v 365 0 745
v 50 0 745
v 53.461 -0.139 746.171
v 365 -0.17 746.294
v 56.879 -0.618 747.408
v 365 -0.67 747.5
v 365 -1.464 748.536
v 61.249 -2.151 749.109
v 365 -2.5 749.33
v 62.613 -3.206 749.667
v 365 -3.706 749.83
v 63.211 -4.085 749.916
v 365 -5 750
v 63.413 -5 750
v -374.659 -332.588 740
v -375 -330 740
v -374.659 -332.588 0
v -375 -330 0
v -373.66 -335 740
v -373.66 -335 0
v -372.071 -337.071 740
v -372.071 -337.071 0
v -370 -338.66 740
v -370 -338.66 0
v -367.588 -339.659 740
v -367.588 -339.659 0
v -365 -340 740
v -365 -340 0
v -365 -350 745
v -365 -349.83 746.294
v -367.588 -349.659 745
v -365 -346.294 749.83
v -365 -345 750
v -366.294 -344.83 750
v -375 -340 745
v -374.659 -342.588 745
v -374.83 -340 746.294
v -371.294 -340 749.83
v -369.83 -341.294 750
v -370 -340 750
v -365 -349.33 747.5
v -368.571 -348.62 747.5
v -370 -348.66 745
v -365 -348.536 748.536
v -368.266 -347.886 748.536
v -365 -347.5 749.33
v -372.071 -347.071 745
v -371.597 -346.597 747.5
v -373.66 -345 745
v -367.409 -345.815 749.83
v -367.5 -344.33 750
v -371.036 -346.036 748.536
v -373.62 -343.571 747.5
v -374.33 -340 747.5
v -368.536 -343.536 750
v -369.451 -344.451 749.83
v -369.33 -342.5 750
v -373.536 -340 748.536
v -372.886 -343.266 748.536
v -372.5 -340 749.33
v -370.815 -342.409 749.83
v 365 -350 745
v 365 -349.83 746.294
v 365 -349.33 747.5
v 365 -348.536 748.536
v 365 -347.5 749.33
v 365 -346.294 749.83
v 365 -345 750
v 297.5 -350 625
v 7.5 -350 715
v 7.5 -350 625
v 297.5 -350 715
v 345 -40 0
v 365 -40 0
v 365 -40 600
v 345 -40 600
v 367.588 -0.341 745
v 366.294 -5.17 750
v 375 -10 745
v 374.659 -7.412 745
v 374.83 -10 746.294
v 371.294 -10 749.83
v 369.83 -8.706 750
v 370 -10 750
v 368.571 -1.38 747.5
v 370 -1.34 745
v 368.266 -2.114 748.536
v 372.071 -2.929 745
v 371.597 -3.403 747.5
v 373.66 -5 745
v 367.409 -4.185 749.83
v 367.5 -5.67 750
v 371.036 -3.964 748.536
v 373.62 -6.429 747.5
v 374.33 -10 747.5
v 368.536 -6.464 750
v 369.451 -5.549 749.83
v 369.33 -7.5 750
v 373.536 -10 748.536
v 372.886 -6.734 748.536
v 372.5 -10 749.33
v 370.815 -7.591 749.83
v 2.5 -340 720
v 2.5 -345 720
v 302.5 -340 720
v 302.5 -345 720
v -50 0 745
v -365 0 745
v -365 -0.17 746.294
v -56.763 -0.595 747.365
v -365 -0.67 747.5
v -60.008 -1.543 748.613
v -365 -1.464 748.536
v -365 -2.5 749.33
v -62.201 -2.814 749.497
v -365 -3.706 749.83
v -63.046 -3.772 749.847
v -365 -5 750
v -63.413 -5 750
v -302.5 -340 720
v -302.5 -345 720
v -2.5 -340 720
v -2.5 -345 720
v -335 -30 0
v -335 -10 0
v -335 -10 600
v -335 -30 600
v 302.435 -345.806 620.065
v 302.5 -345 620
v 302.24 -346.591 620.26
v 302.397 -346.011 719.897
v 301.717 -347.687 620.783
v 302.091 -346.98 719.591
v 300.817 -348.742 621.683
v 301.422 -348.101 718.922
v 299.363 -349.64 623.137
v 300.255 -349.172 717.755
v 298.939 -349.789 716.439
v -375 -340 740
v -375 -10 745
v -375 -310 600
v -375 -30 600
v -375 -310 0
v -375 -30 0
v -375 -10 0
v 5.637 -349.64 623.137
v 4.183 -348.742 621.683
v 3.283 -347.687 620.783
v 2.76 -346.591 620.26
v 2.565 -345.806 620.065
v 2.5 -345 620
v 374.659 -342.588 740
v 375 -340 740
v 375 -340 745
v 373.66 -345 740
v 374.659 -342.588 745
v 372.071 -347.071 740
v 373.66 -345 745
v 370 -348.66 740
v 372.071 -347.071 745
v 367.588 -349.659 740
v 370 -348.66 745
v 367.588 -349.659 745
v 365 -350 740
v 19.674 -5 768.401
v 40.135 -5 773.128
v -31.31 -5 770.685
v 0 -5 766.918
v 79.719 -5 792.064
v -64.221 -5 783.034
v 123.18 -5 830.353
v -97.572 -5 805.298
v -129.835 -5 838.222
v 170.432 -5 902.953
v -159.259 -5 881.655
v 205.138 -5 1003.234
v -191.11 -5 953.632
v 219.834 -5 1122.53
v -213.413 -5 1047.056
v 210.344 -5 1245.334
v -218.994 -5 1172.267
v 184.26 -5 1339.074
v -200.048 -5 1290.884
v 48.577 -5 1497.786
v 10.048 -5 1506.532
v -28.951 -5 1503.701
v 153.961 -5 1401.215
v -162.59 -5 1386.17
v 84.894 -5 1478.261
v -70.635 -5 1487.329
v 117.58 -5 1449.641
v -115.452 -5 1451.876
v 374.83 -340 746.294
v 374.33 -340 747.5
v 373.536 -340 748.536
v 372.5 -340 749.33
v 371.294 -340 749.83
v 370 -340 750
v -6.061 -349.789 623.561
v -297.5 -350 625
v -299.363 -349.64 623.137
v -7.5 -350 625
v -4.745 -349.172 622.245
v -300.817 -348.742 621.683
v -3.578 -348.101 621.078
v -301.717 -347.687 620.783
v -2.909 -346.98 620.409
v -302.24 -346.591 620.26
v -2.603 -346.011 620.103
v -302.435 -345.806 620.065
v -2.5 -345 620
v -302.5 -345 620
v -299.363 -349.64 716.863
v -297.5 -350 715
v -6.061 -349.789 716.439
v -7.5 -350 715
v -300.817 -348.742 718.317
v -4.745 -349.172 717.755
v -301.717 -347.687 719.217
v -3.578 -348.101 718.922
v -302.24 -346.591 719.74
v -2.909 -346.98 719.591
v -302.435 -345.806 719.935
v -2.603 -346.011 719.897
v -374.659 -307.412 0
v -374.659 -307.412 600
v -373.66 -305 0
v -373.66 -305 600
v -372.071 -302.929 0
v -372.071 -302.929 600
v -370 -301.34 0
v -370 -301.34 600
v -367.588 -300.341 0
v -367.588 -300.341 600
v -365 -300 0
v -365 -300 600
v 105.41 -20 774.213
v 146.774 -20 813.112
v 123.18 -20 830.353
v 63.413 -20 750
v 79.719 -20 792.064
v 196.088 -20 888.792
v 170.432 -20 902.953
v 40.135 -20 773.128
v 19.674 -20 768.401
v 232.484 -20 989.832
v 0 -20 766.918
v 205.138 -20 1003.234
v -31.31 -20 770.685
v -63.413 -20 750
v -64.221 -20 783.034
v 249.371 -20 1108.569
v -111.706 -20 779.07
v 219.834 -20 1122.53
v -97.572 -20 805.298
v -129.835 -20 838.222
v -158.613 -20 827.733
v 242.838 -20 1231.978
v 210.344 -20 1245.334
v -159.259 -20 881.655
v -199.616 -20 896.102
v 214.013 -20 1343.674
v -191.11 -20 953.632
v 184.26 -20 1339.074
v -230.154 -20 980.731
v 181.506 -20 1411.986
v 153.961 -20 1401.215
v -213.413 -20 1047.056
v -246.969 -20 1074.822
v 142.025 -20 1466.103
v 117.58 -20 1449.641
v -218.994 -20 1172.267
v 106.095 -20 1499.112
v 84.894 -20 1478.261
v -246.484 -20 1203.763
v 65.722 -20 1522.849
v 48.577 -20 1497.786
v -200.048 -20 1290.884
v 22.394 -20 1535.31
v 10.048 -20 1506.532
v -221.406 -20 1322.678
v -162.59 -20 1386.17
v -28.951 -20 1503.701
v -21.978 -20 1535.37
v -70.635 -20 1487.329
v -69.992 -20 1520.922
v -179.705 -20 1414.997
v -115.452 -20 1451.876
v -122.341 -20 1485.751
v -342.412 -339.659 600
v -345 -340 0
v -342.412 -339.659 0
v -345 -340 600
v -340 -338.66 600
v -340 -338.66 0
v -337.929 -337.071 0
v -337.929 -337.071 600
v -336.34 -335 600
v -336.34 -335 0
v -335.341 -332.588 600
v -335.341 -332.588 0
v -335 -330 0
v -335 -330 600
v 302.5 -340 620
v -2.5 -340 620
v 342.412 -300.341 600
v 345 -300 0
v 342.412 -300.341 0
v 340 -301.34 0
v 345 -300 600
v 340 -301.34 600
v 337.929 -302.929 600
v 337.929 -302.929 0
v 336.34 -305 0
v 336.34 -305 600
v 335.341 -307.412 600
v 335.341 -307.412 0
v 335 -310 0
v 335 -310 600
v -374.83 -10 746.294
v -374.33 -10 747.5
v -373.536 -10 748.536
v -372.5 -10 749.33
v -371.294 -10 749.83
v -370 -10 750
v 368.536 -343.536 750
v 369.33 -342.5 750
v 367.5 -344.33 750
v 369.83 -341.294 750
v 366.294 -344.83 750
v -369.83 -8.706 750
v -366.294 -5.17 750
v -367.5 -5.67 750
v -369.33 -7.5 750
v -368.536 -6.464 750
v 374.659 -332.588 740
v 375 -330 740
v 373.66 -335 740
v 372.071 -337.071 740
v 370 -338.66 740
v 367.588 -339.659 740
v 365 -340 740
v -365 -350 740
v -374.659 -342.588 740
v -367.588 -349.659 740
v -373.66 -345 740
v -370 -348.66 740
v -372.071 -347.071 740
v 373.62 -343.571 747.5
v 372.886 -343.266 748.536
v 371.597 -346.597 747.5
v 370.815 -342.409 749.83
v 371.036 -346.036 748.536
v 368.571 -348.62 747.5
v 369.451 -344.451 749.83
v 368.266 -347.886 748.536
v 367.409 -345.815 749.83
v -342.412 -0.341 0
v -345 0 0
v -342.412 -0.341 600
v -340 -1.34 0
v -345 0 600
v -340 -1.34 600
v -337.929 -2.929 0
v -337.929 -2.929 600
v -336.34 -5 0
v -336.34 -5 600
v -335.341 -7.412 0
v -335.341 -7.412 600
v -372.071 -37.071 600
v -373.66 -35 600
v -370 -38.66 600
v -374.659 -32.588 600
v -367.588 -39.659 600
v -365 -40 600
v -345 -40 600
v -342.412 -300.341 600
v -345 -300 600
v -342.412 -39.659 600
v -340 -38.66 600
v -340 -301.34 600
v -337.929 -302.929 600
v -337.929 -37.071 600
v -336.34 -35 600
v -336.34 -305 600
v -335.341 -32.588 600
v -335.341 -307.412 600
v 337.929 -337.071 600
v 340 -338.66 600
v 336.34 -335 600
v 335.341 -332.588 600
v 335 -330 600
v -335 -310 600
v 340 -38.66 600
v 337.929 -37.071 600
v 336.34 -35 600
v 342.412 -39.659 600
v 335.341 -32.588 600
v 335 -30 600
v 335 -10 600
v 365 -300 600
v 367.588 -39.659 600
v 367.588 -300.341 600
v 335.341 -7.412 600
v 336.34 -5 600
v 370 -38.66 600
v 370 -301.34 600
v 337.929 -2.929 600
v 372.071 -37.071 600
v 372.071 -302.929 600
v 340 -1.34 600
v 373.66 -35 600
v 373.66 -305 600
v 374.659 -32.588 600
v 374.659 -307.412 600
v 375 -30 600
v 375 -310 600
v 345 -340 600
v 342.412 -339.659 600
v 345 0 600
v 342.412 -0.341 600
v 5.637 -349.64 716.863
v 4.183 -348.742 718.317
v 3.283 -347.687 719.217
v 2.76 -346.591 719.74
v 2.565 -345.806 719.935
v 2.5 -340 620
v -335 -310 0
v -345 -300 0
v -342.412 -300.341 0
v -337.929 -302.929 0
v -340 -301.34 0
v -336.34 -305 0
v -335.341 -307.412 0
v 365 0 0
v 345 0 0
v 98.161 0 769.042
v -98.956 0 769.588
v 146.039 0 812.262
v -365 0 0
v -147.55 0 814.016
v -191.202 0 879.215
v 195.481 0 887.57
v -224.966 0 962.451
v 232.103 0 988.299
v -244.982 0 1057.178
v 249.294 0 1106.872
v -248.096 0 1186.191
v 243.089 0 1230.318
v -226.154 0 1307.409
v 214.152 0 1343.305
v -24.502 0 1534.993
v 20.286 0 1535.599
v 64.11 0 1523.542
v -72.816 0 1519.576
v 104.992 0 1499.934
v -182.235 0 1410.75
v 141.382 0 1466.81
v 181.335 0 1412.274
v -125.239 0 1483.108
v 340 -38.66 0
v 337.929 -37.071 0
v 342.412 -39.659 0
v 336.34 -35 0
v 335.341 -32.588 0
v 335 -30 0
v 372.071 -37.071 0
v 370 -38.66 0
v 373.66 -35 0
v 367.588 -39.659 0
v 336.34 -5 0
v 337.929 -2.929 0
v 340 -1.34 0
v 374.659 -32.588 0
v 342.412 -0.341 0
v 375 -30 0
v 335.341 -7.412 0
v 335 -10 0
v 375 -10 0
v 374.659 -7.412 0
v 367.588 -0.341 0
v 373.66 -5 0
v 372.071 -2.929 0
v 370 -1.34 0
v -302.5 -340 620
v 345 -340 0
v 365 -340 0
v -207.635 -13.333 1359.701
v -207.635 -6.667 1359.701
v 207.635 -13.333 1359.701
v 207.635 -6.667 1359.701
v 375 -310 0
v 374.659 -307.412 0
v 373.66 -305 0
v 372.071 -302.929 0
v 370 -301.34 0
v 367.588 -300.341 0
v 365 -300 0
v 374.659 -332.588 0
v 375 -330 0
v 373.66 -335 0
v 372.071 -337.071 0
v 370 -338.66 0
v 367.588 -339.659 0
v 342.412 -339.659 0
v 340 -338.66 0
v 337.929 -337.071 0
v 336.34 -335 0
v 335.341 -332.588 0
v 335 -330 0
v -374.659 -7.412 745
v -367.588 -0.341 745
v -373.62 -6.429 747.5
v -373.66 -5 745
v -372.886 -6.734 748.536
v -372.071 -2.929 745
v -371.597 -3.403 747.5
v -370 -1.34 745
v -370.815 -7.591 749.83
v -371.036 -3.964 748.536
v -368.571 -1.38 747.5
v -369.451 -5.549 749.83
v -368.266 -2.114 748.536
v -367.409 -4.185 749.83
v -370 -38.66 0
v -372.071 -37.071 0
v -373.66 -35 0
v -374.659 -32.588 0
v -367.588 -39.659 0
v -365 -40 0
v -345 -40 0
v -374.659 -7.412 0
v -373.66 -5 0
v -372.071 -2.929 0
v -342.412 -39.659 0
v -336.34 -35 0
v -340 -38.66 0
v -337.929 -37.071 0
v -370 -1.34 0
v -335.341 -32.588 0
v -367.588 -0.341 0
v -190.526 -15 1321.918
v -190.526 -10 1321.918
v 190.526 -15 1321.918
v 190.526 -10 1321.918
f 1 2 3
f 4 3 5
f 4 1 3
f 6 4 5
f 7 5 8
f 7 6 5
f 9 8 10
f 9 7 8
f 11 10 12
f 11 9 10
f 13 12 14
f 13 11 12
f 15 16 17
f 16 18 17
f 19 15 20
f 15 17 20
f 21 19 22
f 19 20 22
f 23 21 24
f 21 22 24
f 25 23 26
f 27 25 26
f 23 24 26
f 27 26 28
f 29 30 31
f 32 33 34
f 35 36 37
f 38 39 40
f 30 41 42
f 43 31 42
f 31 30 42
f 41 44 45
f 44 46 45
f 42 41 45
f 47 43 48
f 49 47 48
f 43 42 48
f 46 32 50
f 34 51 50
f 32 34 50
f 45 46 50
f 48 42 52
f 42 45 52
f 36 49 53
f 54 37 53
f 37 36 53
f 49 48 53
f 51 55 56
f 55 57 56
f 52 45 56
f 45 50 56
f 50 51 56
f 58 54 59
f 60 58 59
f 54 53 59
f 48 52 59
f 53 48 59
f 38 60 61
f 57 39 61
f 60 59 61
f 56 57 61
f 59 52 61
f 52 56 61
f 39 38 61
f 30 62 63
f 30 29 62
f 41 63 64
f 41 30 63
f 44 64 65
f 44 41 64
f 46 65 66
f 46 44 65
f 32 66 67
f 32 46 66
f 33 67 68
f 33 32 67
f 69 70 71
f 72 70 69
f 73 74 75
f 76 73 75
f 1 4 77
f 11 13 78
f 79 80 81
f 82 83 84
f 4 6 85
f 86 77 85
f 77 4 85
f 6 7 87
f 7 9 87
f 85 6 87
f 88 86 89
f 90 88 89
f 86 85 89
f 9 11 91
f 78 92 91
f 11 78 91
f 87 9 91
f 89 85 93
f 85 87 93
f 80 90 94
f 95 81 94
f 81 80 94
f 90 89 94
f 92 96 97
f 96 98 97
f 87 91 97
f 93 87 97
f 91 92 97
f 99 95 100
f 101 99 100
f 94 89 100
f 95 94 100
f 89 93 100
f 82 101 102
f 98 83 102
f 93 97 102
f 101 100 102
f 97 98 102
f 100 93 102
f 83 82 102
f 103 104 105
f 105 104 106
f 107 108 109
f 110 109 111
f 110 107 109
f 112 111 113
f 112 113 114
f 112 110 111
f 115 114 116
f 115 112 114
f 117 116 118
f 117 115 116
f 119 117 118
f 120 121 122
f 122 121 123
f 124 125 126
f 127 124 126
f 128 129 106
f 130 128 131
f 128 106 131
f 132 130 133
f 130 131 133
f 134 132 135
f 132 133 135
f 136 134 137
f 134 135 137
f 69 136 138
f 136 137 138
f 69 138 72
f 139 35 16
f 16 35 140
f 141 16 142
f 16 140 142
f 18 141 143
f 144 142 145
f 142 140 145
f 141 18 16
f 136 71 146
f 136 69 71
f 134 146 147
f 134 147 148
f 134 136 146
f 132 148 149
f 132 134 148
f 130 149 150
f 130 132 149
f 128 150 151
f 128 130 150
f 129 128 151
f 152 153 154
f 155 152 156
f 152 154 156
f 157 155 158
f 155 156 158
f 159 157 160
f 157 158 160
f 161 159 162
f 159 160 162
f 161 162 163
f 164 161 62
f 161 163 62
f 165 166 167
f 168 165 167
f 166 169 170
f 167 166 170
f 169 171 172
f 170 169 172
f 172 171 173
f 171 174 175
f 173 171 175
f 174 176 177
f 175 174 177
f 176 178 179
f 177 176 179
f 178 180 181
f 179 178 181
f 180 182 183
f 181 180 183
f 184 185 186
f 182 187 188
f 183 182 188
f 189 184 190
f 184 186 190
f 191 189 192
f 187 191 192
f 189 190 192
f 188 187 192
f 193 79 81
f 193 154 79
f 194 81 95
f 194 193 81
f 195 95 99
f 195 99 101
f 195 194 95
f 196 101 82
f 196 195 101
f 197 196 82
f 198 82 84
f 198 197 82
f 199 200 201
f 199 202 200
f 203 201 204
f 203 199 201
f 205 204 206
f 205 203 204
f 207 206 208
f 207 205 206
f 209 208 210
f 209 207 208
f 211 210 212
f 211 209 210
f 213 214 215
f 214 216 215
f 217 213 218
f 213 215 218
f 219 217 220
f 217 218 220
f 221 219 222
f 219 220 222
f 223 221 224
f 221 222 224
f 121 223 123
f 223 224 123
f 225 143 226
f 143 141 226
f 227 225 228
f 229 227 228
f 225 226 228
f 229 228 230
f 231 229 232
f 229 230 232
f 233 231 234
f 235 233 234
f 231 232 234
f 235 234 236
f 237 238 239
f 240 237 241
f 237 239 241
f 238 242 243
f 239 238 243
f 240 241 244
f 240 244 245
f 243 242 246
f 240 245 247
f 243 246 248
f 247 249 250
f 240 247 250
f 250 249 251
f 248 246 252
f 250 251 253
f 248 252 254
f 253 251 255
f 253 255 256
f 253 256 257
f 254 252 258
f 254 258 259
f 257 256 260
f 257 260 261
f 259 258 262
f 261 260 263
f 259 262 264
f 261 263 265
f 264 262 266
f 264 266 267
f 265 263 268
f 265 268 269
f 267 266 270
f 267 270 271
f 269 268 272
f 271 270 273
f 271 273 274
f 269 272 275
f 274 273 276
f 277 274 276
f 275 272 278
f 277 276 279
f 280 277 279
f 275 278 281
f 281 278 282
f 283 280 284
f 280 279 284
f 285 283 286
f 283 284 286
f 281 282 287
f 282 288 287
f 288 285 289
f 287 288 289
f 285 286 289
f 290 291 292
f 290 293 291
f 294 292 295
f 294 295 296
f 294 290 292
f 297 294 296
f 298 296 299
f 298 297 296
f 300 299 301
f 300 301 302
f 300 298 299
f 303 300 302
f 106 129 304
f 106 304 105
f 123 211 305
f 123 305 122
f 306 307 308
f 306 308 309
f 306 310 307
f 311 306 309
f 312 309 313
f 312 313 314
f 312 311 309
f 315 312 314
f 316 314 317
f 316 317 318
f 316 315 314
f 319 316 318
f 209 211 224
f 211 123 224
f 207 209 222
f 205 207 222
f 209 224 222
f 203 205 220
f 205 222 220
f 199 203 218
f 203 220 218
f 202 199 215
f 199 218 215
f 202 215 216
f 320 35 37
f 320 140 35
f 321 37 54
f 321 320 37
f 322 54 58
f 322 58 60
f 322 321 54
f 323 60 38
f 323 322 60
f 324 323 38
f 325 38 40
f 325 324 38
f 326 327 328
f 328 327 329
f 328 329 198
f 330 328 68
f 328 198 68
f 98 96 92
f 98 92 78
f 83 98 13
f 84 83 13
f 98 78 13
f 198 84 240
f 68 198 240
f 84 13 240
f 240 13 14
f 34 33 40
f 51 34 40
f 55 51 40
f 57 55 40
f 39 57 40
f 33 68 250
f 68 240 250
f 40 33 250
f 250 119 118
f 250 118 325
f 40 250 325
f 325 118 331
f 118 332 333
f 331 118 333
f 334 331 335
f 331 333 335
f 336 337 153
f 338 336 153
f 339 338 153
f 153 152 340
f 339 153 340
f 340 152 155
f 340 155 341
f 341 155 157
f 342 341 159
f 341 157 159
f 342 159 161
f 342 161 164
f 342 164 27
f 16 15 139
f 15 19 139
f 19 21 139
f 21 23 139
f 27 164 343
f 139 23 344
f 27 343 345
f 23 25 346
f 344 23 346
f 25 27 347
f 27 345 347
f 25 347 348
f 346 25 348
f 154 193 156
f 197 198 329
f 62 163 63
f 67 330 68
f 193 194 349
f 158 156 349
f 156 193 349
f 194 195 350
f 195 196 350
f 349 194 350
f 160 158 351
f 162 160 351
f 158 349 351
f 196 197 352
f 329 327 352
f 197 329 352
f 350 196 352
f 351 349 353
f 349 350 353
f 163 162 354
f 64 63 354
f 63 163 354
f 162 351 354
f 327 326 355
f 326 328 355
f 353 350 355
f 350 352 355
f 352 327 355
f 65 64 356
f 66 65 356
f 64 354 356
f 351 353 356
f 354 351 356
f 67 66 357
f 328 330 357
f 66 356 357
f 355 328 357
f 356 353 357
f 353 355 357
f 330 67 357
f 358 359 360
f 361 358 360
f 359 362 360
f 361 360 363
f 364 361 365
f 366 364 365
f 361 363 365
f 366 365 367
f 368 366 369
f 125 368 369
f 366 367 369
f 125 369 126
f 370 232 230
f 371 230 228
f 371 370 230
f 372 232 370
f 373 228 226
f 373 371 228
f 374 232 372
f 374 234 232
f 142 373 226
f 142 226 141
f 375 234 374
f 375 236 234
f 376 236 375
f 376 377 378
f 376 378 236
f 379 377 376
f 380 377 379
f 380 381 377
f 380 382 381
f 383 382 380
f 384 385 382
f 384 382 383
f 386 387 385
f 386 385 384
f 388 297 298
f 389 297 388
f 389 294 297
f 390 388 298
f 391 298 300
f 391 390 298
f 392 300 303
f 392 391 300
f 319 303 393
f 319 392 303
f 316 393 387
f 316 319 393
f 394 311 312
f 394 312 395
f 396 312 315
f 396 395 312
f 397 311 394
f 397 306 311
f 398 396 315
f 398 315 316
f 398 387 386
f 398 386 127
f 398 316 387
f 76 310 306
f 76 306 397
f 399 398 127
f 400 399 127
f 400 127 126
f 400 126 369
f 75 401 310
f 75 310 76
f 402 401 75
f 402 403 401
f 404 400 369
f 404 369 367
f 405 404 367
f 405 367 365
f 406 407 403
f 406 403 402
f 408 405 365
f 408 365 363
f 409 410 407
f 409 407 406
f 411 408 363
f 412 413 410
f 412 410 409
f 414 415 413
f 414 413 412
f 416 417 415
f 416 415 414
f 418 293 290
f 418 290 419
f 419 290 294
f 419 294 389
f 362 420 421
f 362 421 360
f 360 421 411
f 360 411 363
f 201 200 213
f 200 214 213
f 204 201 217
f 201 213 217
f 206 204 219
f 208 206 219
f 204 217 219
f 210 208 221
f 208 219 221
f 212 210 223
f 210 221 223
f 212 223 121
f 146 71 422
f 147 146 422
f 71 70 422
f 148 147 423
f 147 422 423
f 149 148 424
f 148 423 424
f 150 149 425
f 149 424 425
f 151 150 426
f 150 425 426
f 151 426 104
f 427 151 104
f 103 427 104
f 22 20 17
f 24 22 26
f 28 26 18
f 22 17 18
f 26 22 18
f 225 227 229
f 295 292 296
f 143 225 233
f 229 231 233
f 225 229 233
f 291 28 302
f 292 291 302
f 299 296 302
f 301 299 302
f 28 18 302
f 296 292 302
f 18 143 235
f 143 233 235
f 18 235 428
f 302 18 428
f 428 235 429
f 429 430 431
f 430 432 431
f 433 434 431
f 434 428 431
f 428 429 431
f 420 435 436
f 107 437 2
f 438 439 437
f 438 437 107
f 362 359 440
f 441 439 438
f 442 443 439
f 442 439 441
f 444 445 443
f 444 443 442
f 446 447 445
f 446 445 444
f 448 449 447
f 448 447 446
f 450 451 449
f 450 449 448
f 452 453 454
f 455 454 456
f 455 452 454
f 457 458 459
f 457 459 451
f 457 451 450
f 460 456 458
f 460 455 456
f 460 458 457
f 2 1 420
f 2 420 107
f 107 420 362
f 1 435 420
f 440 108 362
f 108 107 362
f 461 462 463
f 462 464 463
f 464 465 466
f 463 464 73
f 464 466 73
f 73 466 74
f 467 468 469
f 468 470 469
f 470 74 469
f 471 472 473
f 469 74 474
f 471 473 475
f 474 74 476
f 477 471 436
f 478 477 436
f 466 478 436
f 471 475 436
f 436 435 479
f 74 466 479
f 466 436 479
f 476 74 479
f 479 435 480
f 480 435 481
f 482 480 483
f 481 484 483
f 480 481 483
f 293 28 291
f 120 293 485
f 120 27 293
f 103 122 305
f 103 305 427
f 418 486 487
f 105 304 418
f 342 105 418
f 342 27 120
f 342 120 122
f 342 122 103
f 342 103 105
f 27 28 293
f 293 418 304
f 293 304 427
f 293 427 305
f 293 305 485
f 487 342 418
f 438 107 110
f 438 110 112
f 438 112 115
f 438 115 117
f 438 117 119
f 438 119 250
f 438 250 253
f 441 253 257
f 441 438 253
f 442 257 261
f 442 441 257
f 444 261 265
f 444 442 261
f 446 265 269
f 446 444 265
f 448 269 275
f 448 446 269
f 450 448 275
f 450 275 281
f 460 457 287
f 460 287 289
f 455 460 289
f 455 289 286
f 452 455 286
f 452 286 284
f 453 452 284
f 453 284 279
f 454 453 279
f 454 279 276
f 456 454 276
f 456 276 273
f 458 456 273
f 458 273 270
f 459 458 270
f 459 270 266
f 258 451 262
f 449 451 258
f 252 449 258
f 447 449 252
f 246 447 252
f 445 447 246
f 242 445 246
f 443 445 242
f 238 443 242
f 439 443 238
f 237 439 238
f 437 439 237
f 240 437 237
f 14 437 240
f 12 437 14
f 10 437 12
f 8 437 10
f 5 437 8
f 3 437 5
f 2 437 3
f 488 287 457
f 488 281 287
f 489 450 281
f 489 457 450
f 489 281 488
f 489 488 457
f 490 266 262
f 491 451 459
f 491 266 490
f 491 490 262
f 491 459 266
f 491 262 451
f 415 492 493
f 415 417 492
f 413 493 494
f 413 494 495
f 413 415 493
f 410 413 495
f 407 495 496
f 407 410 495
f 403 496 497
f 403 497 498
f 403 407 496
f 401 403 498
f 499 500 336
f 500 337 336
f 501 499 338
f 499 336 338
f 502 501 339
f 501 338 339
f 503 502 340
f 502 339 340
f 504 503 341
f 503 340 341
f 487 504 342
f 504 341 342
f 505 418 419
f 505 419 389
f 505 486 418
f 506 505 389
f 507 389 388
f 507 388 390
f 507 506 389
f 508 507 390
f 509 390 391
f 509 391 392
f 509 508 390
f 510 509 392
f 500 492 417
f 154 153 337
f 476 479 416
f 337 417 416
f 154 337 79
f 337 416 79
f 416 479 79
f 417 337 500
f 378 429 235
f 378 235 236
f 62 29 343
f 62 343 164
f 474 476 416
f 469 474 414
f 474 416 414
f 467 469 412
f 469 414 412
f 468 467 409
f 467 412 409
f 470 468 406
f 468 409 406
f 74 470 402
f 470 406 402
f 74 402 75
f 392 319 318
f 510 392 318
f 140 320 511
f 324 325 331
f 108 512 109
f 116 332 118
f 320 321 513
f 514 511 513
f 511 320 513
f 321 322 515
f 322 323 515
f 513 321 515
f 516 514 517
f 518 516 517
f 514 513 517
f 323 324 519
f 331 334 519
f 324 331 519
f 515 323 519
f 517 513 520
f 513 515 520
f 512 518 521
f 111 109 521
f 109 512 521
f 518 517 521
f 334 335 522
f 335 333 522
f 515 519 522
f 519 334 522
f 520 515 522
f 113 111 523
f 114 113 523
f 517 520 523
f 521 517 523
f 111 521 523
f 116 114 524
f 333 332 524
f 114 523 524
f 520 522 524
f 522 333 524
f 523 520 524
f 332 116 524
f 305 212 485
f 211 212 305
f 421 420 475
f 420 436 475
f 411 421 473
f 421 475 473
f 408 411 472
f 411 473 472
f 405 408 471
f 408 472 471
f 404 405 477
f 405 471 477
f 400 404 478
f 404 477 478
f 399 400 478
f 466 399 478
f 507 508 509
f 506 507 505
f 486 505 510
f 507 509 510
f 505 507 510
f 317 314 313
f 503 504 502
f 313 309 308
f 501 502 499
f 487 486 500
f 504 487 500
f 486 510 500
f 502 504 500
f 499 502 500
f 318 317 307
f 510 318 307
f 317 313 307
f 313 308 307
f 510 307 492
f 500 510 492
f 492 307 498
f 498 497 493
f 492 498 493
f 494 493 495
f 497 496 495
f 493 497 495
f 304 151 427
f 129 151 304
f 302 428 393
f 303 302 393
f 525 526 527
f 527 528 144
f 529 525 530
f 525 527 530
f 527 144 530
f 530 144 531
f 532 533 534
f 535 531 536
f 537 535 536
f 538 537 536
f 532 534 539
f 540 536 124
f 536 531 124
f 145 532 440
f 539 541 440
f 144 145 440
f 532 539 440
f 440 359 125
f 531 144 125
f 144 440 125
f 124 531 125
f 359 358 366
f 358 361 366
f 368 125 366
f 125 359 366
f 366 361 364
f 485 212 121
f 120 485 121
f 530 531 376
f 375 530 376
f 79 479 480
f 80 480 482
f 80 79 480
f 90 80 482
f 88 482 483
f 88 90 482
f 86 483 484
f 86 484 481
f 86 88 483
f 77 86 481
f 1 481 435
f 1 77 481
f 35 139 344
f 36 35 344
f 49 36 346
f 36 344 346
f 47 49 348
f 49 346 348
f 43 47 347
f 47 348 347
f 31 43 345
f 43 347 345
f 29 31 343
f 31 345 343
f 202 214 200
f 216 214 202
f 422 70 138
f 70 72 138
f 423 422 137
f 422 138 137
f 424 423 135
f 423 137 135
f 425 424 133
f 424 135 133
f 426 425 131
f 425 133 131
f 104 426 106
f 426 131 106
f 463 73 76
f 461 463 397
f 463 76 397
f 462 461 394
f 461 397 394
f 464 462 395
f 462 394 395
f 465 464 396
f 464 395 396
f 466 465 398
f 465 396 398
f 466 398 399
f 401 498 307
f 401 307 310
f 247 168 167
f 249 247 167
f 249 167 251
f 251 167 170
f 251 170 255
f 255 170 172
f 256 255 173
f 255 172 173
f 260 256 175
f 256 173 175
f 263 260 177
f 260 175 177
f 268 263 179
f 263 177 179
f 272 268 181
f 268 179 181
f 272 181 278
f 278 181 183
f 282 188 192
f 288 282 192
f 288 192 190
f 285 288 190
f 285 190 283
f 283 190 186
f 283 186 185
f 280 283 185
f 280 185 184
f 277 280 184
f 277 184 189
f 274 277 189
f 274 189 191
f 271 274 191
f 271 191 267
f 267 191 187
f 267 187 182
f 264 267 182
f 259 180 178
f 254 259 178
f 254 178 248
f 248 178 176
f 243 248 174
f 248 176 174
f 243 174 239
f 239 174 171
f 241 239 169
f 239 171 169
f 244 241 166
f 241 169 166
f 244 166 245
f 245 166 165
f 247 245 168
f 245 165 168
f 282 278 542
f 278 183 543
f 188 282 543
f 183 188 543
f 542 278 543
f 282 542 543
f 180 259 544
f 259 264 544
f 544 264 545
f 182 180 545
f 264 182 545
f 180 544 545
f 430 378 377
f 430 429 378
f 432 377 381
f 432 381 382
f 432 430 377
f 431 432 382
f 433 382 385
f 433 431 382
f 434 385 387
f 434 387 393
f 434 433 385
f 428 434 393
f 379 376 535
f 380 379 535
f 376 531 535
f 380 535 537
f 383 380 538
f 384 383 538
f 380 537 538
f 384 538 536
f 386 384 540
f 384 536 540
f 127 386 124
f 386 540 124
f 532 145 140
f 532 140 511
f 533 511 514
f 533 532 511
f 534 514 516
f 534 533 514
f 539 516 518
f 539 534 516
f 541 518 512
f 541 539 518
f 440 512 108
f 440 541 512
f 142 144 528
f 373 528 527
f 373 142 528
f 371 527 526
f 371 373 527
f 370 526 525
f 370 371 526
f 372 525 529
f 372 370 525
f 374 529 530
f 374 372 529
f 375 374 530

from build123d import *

# Parameters (mm, degrees)
F1_DEPTH  = 350
F2_W      = 260
F2_H      = 610
F3_DEPTH  = 750.001
F4_W      = 300
F4_H      = 100
F5_DEPTH  = 10
F6_R      = 9.9999
F7_R      = 5
F8_R      = 5
F10_DEPTH = 5
F11_DEPTH = 20


# Not quite as in the source:
# - a fillet or chamfer is up to 0.001 mm smaller than in the source, because OpenCascade refuses the exact size


with BuildPart() as f1:
    # F0 (on Front) → F1 (new body)
    with BuildSketch(Plane.XZ):
        Polygon((375, 750), (-375, 750), (-375, 600), (-375, 0), (-335, 0), (-335, 600), (335, 600), (335, 0), (375, 0), (375, 600), align=None)
    extrude(amount=F1_DEPTH)

    # F2 (on face) → F3 (cut, through all)
    with BuildSketch(Plane.YZ.offset(375)):
        with Locations((-170, 295)):
            Rectangle(F2_W, F2_H)
    extrude(amount=-F3_DEPTH, mode=Mode.SUBTRACT)

    # F4 (on face) → F5 (cut)
    with BuildSketch(Plane.XZ.offset(350)):
        Polygon((375, 740), (-375, 740), (-375, 0), (-335, 0), (-335, 600), (335, 600), (335, 0), (375, 0), align=None)
        with Locations((-152.5, 670)):
            Rectangle(F4_W, F4_H, mode=Mode.SUBTRACT)
        with Locations((152.5, 670)):
            Rectangle(F4_W, F4_H, mode=Mode.SUBTRACT)
    extrude(amount=-F5_DEPTH, mode=Mode.SUBTRACT)

    # F6 (radius 10 in the source; OpenCascade refuses exactly that, so slightly less here)
    f6_edges = [f1.edges().sort_by_distance(p)[0] for p in [
        (-375, 0, 375),
        (-375, -340, 370),
        (375, -340, 370),
        (375, 0, 375),
        (335, -40, 300),
        (335, 0, 300),
        (375, -40, 300),
        (-335, 0, 300),
        (-335, -40, 300),
        (-375, -40, 300),
        (375, -300, 300),
        (335, -300, 300),
        (335, -340, 300),
        (-335, -340, 300),
        (-335, -300, 300),
        (-375, -300, 300),
        (375, -350, 745),
        (-375, -350, 745),
    ]]
    fillet(f6_edges, radius=F6_R)

    # F7
    f7_edges = [f1.edges().sort_by_distance(p)[0] for p in [
        (152.5, -350, 620),
        (302.5, -350, 670),
        (152.5, -350, 720),
        (2.5, -350, 670),
        (-2.5, -350, 670),
        (-152.5, -350, 620),
        (-302.5, -350, 670),
        (-152.5, -350, 720),
    ]]
    fillet(f7_edges, radius=F7_R)

    # F8
    f8_edges = [f1.edges().sort_by_distance(p)[0] for p in [
        (0, -350, 750),
    ]]
    fillet(f8_edges, radius=F8_R)



with BuildPart() as f10:
    # F9 (on face) → F10 (new body)
    with BuildSketch(Plane(origin=(0, 0, 0), x_dir=(-1, 0, 0), z_dir=(0, 1, 0))):
        with BuildLine():
            add(Edge.make_bspline(
                [(0, 766.9183588453), (381.0511776652, 766.9183588453), (190.5255888326, 1321.9183588453), (0, 1876.9183588453), (-190.5255888326, 1321.9183588453), (-381.0511776652, 766.9183588453), (0, 766.9183588453)],
                knots=[0, 0, 0, 2.0943951024, 2.0943951024, 4.1887902048, 4.1887902048, 6.2831853072, 6.2831853072, 6.2831853072], degree=2, weights=[1, 0.5, 1, 0.5, 1, 0.5, 1]))
        make_face()
    extrude(amount=-F10_DEPTH)


with BuildPart() as f1_1:
    add(f1.part)

    add(f10.part)  # F11 merges F10
    # F9 (on face) → F11 (join)
    with BuildSketch(Plane(origin=(0, 0, 0), x_dir=(-1, 0, 0), z_dir=(0, 1, 0))):
        with BuildLine():
            Line((-50, 745), (50, 745))
            add(Edge.make_bspline(
                [(50, 745), (415.2704758851, 864.2968378696), (207.6352379426, 1359.7013842068), (0, 1855.1059305439), (-207.6352379426, 1359.7013842068), (-415.2704758851, 864.2968378696), (-50, 745)],
                knots=[0.2013579208, 0.2013579208, 0.2013579208, 2.1615144093, 2.1615144093, 4.1216708979, 4.1216708979, 6.0818273864, 6.0818273864, 6.0818273864], degree=2, weights=[1, 0.5569575634, 1, 0.5569575634, 1, 0.5569575634, 1]))
        make_face()
        with BuildLine():
            add(Edge.make_bspline(
                [(0, 766.9183588453), (381.0511776652, 766.9183588453), (190.5255888326, 1321.9183588453), (0, 1876.9183588453), (-190.5255888326, 1321.9183588453), (-381.0511776652, 766.9183588453), (0, 766.9183588453)],
                knots=[0, 0, 0, 2.0943951024, 2.0943951024, 4.1887902048, 4.1887902048, 6.2831853072, 6.2831853072, 6.2831853072], degree=2, weights=[1, 0.5, 1, 0.5, 1, 0.5, 1]))
        make_face(mode=Mode.SUBTRACT)
    extrude(amount=-F11_DEPTH)


solid = f1_1.part
